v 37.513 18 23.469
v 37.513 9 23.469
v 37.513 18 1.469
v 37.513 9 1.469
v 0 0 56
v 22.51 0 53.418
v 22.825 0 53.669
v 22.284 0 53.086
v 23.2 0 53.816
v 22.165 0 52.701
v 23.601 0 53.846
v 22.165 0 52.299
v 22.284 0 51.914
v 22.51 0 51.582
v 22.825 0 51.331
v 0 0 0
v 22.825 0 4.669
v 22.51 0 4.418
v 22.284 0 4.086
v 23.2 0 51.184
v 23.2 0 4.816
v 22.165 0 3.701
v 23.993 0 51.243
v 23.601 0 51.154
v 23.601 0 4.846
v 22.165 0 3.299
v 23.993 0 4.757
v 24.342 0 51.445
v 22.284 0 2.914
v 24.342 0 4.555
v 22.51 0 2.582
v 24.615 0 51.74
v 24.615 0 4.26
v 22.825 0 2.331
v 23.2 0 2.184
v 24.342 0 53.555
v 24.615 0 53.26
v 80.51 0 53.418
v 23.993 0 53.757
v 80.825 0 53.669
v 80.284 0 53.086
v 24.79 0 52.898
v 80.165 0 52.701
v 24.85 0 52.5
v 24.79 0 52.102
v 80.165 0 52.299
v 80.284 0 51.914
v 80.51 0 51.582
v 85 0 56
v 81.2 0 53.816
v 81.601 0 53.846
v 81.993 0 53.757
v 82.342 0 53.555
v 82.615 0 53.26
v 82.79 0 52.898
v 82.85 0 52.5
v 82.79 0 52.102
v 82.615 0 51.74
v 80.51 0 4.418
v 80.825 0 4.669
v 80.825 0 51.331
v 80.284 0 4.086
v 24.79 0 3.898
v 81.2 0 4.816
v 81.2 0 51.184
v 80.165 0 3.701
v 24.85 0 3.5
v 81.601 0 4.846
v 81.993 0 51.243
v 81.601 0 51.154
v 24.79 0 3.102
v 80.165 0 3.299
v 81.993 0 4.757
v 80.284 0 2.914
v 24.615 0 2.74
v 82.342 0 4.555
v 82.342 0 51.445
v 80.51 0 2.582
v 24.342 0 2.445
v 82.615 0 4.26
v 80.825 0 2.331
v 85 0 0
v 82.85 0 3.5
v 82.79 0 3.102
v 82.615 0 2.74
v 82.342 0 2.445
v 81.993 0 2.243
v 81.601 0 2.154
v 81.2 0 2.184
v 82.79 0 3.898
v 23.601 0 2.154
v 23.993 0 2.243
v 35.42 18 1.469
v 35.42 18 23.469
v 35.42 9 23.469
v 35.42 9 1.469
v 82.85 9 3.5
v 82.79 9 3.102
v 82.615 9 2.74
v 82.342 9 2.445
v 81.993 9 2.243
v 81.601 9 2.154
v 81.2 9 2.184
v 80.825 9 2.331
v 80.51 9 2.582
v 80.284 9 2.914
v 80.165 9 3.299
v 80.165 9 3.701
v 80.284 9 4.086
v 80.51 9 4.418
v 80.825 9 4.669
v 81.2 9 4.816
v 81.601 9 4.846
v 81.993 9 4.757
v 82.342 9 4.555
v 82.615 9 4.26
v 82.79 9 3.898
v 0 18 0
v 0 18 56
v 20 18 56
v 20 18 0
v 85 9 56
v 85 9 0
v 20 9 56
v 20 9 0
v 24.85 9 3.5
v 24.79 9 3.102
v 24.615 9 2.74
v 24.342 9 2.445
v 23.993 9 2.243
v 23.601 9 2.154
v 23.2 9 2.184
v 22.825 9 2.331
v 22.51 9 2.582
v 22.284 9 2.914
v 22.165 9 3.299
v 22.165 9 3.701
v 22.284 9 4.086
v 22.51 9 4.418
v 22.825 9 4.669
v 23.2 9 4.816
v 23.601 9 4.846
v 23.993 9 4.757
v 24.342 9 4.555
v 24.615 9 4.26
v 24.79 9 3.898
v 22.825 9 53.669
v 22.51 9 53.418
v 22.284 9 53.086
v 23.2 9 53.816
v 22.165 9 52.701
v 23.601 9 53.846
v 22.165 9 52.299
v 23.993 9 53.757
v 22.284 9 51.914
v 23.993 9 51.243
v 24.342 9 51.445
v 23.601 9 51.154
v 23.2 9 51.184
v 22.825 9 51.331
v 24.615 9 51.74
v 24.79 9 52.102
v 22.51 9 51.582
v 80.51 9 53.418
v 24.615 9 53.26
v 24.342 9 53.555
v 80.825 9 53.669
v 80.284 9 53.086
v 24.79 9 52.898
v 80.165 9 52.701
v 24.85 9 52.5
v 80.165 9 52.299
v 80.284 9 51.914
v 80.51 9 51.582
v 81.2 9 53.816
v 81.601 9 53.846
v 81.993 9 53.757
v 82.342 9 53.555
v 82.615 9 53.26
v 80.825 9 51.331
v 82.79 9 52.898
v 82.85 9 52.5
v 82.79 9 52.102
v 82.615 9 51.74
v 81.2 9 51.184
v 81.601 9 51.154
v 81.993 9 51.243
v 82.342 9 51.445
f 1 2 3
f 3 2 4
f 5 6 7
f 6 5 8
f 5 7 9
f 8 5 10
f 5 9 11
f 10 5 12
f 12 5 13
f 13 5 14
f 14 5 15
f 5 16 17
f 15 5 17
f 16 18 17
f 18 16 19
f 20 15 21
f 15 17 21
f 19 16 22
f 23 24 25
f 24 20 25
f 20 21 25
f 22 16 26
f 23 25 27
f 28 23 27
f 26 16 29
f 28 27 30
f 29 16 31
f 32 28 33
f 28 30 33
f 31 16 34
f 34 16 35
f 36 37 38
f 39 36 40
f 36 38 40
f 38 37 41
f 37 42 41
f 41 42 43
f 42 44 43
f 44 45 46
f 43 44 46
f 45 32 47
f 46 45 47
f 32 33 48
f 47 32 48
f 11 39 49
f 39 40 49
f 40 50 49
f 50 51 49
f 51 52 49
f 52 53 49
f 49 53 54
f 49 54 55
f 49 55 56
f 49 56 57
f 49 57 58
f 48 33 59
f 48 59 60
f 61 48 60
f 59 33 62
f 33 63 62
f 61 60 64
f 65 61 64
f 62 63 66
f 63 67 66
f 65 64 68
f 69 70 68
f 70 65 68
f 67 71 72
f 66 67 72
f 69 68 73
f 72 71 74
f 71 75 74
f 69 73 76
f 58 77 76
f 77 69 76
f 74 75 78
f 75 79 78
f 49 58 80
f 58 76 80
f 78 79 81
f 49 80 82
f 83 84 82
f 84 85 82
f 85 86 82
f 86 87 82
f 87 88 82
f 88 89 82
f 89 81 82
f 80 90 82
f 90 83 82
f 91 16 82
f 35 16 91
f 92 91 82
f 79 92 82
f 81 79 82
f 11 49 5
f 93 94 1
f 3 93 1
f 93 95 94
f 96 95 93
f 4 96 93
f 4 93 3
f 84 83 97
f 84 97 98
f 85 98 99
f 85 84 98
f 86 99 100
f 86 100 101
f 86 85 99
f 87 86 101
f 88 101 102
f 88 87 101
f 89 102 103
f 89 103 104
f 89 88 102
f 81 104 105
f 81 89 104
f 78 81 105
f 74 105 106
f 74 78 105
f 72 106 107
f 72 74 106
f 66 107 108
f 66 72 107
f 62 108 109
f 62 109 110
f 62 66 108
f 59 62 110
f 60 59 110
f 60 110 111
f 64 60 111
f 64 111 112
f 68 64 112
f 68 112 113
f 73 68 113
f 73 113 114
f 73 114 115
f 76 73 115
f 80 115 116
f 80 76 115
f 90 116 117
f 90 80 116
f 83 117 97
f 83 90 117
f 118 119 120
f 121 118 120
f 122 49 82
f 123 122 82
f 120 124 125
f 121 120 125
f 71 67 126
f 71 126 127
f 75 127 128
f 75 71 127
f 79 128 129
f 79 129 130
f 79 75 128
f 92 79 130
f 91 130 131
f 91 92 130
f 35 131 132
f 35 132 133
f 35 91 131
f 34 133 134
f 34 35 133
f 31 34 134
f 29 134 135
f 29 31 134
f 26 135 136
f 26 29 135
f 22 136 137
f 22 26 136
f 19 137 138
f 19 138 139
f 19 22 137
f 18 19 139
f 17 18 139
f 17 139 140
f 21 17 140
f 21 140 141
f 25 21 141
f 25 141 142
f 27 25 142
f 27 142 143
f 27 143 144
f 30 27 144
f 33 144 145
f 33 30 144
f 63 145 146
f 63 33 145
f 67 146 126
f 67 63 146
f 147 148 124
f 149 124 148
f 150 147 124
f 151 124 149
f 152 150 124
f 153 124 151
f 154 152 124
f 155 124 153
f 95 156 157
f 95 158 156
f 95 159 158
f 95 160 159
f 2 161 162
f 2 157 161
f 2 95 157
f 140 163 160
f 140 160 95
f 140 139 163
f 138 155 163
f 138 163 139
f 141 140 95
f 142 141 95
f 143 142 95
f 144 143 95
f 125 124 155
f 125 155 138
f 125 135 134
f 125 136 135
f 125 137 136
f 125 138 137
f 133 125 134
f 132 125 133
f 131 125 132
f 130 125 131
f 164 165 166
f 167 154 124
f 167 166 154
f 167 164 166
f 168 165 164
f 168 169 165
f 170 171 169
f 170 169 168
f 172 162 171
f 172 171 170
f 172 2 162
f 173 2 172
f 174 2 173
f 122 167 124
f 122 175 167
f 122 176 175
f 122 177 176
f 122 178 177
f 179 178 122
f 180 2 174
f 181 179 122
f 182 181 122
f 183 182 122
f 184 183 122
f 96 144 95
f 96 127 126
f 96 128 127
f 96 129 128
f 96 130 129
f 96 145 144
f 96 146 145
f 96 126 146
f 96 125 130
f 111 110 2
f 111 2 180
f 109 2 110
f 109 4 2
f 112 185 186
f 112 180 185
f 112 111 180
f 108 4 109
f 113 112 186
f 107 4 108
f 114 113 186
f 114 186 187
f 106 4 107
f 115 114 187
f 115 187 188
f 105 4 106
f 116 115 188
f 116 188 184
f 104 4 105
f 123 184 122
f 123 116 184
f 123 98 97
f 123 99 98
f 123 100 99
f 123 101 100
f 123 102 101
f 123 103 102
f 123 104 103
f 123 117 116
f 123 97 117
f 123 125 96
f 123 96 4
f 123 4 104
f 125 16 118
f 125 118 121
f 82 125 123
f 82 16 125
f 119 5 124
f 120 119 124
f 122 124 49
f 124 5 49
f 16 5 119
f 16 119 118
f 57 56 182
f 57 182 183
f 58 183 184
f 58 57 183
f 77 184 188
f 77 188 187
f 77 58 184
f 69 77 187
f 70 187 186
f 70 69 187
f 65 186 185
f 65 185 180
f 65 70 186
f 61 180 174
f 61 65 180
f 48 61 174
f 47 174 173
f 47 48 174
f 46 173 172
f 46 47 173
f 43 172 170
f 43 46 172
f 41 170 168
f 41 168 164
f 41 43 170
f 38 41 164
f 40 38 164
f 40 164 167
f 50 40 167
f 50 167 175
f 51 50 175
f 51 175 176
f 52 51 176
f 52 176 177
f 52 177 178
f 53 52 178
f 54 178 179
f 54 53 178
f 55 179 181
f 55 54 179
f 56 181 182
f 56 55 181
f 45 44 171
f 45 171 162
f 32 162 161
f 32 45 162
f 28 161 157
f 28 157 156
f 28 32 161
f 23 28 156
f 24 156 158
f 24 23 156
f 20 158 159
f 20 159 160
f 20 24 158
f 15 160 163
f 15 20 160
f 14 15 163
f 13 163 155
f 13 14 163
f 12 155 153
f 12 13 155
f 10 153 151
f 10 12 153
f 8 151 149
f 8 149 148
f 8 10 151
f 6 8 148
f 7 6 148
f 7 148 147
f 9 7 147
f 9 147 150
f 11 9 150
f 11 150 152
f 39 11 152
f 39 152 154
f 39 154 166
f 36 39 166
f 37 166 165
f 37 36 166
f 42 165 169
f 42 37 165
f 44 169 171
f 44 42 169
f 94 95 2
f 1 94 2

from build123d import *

# Parameters (mm, degrees)
SKETCH1_W             = 20
SKETCH1_H             = 56
BOSS_EXTRUDE1_DEPTH   = 18
SKETCH1_W_2           = 2.09336208
SKETCH1_H_2           = 22
BOSS_EXTRUDE1_2_DEPTH = 18
SKETCH1_3_W           = 65
SKETCH1_3_H           = 56
SKETCH1_3_R           = 1.35
SKETCH1_3_W_2         = 2.09336208
SKETCH1_3_H_2         = 22
BOSS_EXTRUDE2_DEPTH   = 9


with BuildPart() as part:
    # Sketch1 → Boss-Extrude1 (new body)
    with BuildSketch(Plane(origin=(0, 0, 0), x_dir=(1, 0, 0), z_dir=(0, 1, 0))):
        with Locations((10, -28)):
            Rectangle(SKETCH1_W, SKETCH1_H)
    extrude(amount=BOSS_EXTRUDE1_DEPTH)



with BuildPart() as body_2:
    # Sketch1 → Boss-Extrude1 2 (new body)
    with BuildSketch(Plane(origin=(0, 0, 0), x_dir=(1, 0, 0), z_dir=(0, 1, 0))):
        with Locations((36.46668104, -12.469488465)):
            Rectangle(SKETCH1_W_2, SKETCH1_H_2)
    extrude(amount=BOSS_EXTRUDE1_2_DEPTH)


with BuildPart() as part_1:
    add(part.part)

    add(body_2.part)  # Boss-Extrude2 merges body 2
    # Sketch1<3> → Boss-Extrude2 (add)
    with BuildSketch(Plane(origin=(0, 0, 0), x_dir=(1, 0, 0), z_dir=(0, 1, 0))):
        with Locations((52.5, -28)):
            Rectangle(SKETCH1_3_W, SKETCH1_3_H)
        with Locations((23.5, -52.5)):
            Circle(SKETCH1_3_R, mode=Mode.SUBTRACT)
        with Locations((81.5, -52.5)):
            Circle(SKETCH1_3_R, mode=Mode.SUBTRACT)
        with Locations((36.46668104, -12.469488465)):
            Rectangle(SKETCH1_3_W_2, SKETCH1_3_H_2, mode=Mode.SUBTRACT)
        with Locations((23.5, -3.5)):
            Circle(SKETCH1_3_R, mode=Mode.SUBTRACT)
        with Locations((81.5, -3.5)):
            Circle(SKETCH1_3_R, mode=Mode.SUBTRACT)
    extrude(amount=BOSS_EXTRUDE2_DEPTH)


solid = part_1.part
